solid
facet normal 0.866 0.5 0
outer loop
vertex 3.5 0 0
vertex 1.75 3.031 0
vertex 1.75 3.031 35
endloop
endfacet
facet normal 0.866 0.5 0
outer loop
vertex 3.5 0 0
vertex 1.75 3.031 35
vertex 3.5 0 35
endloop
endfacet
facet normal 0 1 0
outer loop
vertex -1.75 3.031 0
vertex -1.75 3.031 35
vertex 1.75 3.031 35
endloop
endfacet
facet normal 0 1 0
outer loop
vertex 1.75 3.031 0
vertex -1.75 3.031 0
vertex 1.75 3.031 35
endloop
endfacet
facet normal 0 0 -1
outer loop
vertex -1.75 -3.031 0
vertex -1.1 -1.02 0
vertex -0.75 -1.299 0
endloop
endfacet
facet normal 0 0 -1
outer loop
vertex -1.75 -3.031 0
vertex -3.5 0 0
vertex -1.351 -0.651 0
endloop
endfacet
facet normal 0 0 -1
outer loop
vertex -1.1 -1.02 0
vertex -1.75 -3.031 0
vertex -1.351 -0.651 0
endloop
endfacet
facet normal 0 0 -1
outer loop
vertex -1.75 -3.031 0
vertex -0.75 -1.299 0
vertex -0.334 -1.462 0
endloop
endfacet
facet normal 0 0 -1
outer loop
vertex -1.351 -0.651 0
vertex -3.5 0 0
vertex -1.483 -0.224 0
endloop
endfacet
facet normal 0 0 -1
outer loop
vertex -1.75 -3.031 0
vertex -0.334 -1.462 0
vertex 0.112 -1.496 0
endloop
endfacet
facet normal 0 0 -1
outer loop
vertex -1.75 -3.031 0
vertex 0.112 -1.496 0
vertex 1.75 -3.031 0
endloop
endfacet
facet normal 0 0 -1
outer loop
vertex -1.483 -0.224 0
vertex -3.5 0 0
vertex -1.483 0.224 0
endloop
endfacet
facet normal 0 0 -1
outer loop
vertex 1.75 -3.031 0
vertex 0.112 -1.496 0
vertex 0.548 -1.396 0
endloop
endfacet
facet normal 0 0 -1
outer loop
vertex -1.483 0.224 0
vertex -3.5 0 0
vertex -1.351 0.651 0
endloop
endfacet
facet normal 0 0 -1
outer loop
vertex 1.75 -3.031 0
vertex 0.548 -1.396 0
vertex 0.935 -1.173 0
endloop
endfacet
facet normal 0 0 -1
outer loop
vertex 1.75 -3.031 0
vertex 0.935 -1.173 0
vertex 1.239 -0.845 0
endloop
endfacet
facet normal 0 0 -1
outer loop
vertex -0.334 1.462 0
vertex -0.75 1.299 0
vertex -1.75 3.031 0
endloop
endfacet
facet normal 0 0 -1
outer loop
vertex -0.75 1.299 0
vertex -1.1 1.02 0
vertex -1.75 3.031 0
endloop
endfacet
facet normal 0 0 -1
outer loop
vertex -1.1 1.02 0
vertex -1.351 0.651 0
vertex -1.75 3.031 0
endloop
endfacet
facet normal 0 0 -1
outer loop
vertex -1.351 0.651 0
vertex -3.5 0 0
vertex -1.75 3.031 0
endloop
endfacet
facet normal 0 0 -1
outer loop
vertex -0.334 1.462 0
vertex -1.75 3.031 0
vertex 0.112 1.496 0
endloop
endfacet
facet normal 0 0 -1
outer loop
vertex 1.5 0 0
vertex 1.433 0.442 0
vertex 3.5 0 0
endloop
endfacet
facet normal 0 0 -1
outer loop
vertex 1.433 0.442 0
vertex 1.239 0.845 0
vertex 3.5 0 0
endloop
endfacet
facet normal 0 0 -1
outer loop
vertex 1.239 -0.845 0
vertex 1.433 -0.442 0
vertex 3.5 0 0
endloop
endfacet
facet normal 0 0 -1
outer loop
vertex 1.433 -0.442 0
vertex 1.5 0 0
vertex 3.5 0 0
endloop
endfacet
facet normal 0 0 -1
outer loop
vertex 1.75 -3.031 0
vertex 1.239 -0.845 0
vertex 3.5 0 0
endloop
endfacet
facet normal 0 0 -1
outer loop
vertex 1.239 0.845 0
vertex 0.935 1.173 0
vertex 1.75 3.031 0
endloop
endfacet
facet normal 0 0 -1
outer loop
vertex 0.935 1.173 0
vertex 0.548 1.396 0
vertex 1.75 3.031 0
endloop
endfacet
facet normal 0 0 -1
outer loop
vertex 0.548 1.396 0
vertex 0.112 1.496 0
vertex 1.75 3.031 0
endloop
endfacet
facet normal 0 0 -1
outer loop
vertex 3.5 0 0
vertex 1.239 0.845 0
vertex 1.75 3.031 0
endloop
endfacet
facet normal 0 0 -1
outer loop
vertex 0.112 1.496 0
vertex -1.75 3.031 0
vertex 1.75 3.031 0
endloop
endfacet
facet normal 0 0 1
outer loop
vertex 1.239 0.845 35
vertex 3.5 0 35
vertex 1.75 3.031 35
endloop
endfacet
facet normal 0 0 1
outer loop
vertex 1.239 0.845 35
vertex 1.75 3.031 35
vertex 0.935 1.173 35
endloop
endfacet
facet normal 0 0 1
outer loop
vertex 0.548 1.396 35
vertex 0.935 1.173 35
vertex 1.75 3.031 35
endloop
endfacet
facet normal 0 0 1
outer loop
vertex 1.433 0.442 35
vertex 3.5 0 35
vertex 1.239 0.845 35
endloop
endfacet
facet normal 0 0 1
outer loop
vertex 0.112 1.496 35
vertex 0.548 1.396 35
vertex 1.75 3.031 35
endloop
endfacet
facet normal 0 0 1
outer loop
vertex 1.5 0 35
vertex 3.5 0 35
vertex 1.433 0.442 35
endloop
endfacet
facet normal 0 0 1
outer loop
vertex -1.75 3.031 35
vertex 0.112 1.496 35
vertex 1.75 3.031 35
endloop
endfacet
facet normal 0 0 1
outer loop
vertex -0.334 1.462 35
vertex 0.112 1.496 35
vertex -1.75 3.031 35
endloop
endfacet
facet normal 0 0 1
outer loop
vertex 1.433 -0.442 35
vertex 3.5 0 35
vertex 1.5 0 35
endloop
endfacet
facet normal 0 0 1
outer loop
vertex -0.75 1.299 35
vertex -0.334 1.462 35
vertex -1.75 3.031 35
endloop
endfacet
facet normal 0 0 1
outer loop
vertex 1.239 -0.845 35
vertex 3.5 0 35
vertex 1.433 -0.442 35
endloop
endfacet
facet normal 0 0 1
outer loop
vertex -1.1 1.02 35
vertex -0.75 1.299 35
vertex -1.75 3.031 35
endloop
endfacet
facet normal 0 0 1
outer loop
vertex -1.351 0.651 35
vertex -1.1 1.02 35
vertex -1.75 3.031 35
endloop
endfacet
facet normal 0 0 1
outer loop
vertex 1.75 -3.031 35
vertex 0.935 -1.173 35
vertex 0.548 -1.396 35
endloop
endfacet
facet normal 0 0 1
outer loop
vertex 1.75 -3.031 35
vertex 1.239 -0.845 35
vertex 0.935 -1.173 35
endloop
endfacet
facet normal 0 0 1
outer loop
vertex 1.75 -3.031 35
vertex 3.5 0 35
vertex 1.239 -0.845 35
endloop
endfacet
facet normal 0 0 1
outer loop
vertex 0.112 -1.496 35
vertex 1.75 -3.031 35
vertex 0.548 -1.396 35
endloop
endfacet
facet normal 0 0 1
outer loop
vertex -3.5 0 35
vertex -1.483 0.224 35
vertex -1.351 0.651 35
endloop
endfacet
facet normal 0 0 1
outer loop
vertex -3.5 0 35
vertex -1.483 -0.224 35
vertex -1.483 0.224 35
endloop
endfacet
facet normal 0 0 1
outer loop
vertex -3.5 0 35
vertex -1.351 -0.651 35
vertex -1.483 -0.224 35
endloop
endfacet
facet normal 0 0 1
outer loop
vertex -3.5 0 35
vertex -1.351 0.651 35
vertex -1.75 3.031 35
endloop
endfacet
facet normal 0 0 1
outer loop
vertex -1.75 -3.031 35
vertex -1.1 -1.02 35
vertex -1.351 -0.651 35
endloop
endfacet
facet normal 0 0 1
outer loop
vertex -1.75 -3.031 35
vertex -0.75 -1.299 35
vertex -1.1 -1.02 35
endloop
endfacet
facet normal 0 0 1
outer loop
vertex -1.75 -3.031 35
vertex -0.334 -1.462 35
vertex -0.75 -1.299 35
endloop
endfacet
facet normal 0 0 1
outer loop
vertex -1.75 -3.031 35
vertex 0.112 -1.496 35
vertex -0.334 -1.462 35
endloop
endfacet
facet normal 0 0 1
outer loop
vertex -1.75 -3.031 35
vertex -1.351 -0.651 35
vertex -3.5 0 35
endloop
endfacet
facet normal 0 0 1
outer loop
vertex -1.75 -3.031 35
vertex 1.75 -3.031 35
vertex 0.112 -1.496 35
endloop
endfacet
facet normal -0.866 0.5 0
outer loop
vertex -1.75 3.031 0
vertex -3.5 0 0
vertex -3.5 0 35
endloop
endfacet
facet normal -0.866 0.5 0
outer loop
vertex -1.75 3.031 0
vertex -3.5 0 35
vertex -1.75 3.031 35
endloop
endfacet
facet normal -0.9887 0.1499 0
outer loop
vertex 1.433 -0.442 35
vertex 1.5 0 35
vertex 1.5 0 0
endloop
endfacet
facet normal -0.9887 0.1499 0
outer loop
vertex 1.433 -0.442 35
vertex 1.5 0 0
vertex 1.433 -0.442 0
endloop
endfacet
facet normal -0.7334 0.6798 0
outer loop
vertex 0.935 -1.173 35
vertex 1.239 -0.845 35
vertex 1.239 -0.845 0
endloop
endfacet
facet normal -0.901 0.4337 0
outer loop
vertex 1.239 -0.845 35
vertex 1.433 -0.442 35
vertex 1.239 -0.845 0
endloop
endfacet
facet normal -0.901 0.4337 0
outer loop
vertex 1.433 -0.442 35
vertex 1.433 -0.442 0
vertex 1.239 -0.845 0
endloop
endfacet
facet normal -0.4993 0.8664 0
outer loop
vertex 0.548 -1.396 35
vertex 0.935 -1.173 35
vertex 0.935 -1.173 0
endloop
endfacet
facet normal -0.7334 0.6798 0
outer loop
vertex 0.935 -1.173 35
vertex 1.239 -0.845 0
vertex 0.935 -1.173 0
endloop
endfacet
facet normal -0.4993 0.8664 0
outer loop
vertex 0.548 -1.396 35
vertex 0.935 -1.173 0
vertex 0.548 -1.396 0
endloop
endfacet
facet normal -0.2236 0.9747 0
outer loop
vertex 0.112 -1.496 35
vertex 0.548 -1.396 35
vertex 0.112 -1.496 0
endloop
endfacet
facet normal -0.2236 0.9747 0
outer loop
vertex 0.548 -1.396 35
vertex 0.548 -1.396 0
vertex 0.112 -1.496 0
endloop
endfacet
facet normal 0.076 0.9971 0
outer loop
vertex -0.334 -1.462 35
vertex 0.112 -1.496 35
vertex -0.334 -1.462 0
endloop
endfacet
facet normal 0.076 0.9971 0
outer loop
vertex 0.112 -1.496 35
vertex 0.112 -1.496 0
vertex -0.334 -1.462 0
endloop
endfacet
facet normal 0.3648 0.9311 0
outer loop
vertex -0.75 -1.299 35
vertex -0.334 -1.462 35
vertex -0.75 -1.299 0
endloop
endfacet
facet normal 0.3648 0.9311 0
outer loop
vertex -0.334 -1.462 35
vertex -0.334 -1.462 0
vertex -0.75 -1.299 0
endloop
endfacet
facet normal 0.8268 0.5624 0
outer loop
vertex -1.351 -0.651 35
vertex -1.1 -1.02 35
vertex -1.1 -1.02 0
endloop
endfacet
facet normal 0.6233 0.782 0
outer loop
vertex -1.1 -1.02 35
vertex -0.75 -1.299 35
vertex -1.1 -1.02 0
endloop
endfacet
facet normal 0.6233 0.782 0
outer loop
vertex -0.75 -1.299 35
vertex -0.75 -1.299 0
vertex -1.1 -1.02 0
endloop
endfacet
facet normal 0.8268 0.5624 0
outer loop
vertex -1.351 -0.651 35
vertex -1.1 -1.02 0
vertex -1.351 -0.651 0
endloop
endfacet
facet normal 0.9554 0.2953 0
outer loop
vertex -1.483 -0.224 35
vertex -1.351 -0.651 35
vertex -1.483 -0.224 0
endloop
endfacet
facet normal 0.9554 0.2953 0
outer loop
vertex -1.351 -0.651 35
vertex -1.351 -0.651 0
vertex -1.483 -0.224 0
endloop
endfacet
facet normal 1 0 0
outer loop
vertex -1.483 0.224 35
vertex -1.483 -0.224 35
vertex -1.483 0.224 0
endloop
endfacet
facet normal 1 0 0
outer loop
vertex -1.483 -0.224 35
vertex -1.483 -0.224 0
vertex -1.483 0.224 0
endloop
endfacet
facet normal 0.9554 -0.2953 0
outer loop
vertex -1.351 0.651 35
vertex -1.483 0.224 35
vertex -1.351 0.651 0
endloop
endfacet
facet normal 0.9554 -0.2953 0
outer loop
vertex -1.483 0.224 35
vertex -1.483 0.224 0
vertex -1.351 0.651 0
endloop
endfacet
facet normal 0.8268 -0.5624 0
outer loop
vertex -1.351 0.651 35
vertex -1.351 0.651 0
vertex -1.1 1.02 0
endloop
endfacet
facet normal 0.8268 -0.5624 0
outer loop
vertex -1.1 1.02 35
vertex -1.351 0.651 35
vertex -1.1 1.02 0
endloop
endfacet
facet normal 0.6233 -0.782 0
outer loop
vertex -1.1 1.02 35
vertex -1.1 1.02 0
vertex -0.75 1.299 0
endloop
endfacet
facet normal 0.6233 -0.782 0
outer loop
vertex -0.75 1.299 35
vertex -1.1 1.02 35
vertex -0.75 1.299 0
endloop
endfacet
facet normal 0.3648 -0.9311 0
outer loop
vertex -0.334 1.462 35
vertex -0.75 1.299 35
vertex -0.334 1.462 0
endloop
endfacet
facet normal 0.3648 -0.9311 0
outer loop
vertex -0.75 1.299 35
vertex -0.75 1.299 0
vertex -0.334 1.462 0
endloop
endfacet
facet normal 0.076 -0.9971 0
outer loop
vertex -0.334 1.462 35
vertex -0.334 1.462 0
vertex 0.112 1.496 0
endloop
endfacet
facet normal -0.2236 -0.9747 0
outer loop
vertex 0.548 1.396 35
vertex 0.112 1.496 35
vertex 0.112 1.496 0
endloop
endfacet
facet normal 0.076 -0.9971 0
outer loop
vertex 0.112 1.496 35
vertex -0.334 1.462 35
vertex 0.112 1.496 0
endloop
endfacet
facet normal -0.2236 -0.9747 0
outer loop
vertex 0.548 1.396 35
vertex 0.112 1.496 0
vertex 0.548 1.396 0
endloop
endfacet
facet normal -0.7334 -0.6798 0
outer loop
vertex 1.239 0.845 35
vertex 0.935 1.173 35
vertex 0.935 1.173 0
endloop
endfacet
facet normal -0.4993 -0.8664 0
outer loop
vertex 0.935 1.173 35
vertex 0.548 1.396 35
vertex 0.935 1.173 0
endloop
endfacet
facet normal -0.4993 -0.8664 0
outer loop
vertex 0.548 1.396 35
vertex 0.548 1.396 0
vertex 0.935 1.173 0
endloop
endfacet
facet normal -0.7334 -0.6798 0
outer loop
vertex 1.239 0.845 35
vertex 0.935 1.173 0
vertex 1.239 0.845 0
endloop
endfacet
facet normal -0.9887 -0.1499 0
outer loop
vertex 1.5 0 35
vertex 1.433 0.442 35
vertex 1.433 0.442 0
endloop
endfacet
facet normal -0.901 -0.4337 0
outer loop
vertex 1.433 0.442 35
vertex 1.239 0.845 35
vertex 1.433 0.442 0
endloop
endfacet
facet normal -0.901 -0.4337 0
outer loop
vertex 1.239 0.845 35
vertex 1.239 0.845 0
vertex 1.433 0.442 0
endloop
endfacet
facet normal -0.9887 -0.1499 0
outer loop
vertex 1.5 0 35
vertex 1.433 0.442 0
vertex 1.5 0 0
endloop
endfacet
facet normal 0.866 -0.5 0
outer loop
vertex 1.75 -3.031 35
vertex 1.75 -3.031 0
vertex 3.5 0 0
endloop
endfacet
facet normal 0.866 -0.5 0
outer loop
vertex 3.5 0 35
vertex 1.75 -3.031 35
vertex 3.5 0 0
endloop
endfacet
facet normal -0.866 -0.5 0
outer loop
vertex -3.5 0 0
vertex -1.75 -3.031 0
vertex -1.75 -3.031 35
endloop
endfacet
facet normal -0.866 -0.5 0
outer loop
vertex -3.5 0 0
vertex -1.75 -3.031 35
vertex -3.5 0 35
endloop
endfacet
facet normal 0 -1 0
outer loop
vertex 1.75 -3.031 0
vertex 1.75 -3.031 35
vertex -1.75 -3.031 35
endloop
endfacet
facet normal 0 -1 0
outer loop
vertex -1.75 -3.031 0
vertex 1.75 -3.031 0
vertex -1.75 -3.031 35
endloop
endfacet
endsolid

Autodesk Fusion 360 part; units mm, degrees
sketch "スケッチ1" plane through (0, 0, 0) normal (0, 0, 1) x (1, 0, 0)
  line L0 (3, 1.7321) -> (0, 3.4641)
  line L1 (0, 3.4641) -> (-3, 1.7321)
  line L2 (-3, 1.7321) -> (-3, -1.7321)
  line L3 (-3, -1.7321) -> (0, -3.4641)
  line L4 (0, -3.4641) -> (3, -1.7321)
  line L5 (3, -1.7321) -> (3, 1.7321)
  circle A0 centre (0, 0) radius 1.5
extrude "押し出し1" add sketch "スケッチ1" along normal blind 35
sketch "スケッチ2" plane through (0, 0, 35) normal (0, 0, 1) x (-1, 0, 0)
  circle A0 centre (0, 0) radius 1.5
  line L0 (-3, 1.7321) -> (-3, -1.7321)
  line L1 (-3, -1.7321) -> (0, -3.4641)
  line L2 (0, -3.4641) -> (3, -1.7321)
  line L3 (3, -1.7321) -> (3, 1.7321)
  line L4 (3, 1.7321) -> (0, 3.4641)
  line L5 (0, 3.4641) -> (-3, 1.7321)
  line L6 (-3.5, 0) -> (-1.75, -3.0311)
  line L7 (-1.75, -3.0311) -> (1.75, -3.0311)
  line L8 (1.75, -3.0311) -> (3.5, 0)
  line L9 (3.5, 0) -> (1.75, 3.0311)
  line L10 (1.75, 3.0311) -> (-1.75, 3.0311)
  line L11 (-1.75, 3.0311) -> (-3.5, 0)
extrude "押し出し2" add sketch "スケッチ2" along normal blind 4 contours L0 L1 L2 L3 L4 L5 L6 L7 L8 L9 L10 L11 | L0 L6 L11 | L5 L10 L11 | L1 L6 L7 | L4 L9 L10 | L2 L7 L8 | L3 L8 L9
extrude "押し出し3" cut 6 faces at (0, -3.1754, 35) (2.75, -1.5877, 35) (-2.75, -1.5877, 35) (-2.75, 1.5877, 35) (0, 3.1754, 35) (2.75, 1.5877, 35) along direction (0, 0, -1) blind 40
extrude "押し出し4" add 6 faces at (1.5833, 2.7424, 35) (3.1667, 0, 35) (-1.5833, 2.7424, 35) (1.5833, -2.7424, 35) (-1.5833, -2.7424, 35) (-3.1667, 0, 35) along direction (0, 0, -1) blind 35
extrude "押し出し5" cut 1 faces at (2.2005, 1.2273, 39) along direction (0, 0, -1) blind 4
